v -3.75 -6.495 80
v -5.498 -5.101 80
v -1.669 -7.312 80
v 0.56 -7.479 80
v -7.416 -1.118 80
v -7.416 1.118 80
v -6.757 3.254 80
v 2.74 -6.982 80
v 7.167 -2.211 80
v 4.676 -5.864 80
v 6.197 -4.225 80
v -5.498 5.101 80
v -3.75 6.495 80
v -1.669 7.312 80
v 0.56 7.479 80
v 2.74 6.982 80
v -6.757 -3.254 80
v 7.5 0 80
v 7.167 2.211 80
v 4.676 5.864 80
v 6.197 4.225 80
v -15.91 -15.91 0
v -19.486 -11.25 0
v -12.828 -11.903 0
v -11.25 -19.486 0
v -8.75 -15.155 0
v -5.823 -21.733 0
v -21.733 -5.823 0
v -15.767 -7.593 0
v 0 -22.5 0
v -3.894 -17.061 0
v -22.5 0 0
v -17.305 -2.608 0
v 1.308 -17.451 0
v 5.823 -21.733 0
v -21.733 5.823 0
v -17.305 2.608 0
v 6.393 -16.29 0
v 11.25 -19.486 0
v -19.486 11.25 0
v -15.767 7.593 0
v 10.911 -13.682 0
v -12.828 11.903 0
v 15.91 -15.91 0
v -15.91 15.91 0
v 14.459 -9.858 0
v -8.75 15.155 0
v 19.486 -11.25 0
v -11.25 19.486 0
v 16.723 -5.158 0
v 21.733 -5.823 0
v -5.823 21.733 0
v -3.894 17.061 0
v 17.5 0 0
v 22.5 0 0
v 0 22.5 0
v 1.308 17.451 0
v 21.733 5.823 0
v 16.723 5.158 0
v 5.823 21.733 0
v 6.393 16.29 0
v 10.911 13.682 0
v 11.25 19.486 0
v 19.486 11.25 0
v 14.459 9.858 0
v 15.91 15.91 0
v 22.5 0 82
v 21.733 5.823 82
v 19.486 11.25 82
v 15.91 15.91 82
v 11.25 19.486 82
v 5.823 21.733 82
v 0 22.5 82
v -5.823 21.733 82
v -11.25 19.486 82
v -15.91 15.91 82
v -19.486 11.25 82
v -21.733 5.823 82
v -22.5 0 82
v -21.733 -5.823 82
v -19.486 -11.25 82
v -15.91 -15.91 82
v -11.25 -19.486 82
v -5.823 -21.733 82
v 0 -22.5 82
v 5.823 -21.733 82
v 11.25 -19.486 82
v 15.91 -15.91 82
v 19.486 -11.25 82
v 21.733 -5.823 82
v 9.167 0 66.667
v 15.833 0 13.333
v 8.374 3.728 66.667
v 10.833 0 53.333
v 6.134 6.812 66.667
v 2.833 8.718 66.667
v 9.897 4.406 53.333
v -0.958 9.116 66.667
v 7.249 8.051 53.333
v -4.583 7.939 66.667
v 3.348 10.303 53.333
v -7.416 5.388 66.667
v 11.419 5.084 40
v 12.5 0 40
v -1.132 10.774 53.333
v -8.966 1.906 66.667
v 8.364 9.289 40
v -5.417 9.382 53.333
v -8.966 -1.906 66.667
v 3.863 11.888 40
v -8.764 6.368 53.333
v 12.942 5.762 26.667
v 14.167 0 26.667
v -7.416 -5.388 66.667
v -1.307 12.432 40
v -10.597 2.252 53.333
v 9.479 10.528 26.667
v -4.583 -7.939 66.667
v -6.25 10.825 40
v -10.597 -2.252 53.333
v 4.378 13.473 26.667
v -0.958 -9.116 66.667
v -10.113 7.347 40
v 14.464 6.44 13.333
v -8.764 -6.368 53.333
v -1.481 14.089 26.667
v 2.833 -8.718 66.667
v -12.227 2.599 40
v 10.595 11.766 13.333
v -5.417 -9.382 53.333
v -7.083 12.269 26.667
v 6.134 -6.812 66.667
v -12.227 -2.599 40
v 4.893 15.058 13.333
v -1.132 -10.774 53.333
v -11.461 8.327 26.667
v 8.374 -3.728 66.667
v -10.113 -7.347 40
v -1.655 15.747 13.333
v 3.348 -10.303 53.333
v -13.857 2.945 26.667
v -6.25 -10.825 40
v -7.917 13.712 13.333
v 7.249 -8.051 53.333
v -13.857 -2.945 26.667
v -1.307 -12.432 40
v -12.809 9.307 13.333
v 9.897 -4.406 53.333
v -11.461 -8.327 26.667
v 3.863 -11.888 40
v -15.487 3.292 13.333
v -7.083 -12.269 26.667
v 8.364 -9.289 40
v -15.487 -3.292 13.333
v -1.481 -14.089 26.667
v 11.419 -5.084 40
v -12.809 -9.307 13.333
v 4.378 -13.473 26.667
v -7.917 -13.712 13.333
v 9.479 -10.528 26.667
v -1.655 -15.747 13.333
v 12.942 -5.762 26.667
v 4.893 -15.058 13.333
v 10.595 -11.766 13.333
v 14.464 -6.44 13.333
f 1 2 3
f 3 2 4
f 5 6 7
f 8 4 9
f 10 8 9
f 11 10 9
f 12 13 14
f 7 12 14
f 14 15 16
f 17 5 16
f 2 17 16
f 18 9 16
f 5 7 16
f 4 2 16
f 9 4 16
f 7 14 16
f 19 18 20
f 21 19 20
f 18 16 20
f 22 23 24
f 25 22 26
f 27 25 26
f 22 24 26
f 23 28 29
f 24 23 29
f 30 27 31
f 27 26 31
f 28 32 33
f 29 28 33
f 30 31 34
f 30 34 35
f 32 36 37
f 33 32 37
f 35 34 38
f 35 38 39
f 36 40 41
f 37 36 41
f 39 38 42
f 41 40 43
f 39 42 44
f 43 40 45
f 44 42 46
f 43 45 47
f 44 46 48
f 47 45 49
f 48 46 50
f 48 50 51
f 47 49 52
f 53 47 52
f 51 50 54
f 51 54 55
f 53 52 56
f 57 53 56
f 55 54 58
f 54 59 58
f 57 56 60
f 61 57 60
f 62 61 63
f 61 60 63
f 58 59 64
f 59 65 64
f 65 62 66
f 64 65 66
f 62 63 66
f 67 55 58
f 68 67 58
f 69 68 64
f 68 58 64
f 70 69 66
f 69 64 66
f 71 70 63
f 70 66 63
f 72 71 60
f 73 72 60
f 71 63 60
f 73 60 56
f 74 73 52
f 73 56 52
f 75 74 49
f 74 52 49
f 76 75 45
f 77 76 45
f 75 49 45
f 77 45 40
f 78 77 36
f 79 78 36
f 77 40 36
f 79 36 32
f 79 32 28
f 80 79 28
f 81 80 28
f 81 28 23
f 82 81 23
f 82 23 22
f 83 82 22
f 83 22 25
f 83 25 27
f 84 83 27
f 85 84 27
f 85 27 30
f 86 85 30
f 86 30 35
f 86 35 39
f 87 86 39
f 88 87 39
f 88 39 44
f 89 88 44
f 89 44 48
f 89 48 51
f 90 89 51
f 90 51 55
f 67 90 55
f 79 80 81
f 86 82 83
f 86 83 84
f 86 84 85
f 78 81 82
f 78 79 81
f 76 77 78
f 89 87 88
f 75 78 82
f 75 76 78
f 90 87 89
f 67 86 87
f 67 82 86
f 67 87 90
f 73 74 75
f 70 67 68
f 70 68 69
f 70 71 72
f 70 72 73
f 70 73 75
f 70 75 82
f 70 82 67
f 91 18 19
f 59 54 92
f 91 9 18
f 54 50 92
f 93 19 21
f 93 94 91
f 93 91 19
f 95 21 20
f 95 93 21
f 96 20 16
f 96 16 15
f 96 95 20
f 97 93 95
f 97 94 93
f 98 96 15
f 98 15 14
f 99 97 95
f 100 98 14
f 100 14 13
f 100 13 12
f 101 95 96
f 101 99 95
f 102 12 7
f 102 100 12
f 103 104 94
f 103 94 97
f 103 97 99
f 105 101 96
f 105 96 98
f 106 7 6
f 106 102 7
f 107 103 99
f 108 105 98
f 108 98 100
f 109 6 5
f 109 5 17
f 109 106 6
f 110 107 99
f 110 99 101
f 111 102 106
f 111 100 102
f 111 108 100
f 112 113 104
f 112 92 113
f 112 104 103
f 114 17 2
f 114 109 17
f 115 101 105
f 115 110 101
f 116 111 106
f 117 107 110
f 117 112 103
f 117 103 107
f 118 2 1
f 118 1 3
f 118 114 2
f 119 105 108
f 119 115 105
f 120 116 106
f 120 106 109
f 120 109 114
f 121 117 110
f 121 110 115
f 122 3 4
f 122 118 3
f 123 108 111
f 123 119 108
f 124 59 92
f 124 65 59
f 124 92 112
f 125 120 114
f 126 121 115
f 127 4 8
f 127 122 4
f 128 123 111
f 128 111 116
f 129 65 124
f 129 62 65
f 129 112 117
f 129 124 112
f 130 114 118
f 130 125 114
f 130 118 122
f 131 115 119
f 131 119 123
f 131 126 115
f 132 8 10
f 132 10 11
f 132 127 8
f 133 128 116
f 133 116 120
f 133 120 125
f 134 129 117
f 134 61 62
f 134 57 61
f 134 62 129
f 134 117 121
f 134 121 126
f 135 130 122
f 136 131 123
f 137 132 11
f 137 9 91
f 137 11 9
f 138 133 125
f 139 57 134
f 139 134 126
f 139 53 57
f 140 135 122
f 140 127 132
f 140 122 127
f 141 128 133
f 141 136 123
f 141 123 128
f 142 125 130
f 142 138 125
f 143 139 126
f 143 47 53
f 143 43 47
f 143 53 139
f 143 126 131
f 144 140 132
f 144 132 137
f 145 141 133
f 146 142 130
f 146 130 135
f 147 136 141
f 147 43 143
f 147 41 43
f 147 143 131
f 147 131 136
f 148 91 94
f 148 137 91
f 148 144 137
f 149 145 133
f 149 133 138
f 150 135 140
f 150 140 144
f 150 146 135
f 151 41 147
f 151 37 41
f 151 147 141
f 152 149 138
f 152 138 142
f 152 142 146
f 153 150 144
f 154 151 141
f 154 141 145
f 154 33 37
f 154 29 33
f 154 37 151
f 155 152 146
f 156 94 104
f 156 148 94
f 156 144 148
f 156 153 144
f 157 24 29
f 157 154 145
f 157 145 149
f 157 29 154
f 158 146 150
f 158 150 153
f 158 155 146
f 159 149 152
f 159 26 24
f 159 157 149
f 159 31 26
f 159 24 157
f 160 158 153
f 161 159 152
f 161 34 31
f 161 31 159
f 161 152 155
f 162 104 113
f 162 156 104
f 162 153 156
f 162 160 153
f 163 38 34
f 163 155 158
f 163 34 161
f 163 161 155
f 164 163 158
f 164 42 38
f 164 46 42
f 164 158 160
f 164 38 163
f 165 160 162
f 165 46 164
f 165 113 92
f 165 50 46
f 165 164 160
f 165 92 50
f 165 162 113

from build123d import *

# Parameters (mm, degrees)
F3_R        = 22.5
F4_DEPTH    = 80
F2_R        = 7.5
F0_R        = 17.5
F4_FACE_R   = 22.5
F4_FACE_R_2 = 7.5
F6_DEPTH    = 2


with BuildPart() as f4:
    # F3 (on Top) → F4 (new body)
    with BuildSketch(Plane.XY):
        Circle(F3_R)
    extrude(amount=F4_DEPTH)

    # F2 (on offset) → F5 section 0
    with BuildSketch(Plane.XY.offset(80)):
        Circle(F2_R)
    # F0 (on Top) → F5 section 1
    with BuildSketch(Plane.XY):
        Circle(F0_R)
    loft(mode=Mode.SUBTRACT)

    # F2 (on offset) + F4_face (on face) → F6 (join)
    with BuildSketch(Plane.XY.offset(80)):
        Circle(F2_R)
    with BuildSketch(Plane.XY.offset(80)):
        Circle(F4_FACE_R)
        Circle(F4_FACE_R_2, mode=Mode.SUBTRACT)
    extrude(amount=F6_DEPTH)


solid = f4.part
